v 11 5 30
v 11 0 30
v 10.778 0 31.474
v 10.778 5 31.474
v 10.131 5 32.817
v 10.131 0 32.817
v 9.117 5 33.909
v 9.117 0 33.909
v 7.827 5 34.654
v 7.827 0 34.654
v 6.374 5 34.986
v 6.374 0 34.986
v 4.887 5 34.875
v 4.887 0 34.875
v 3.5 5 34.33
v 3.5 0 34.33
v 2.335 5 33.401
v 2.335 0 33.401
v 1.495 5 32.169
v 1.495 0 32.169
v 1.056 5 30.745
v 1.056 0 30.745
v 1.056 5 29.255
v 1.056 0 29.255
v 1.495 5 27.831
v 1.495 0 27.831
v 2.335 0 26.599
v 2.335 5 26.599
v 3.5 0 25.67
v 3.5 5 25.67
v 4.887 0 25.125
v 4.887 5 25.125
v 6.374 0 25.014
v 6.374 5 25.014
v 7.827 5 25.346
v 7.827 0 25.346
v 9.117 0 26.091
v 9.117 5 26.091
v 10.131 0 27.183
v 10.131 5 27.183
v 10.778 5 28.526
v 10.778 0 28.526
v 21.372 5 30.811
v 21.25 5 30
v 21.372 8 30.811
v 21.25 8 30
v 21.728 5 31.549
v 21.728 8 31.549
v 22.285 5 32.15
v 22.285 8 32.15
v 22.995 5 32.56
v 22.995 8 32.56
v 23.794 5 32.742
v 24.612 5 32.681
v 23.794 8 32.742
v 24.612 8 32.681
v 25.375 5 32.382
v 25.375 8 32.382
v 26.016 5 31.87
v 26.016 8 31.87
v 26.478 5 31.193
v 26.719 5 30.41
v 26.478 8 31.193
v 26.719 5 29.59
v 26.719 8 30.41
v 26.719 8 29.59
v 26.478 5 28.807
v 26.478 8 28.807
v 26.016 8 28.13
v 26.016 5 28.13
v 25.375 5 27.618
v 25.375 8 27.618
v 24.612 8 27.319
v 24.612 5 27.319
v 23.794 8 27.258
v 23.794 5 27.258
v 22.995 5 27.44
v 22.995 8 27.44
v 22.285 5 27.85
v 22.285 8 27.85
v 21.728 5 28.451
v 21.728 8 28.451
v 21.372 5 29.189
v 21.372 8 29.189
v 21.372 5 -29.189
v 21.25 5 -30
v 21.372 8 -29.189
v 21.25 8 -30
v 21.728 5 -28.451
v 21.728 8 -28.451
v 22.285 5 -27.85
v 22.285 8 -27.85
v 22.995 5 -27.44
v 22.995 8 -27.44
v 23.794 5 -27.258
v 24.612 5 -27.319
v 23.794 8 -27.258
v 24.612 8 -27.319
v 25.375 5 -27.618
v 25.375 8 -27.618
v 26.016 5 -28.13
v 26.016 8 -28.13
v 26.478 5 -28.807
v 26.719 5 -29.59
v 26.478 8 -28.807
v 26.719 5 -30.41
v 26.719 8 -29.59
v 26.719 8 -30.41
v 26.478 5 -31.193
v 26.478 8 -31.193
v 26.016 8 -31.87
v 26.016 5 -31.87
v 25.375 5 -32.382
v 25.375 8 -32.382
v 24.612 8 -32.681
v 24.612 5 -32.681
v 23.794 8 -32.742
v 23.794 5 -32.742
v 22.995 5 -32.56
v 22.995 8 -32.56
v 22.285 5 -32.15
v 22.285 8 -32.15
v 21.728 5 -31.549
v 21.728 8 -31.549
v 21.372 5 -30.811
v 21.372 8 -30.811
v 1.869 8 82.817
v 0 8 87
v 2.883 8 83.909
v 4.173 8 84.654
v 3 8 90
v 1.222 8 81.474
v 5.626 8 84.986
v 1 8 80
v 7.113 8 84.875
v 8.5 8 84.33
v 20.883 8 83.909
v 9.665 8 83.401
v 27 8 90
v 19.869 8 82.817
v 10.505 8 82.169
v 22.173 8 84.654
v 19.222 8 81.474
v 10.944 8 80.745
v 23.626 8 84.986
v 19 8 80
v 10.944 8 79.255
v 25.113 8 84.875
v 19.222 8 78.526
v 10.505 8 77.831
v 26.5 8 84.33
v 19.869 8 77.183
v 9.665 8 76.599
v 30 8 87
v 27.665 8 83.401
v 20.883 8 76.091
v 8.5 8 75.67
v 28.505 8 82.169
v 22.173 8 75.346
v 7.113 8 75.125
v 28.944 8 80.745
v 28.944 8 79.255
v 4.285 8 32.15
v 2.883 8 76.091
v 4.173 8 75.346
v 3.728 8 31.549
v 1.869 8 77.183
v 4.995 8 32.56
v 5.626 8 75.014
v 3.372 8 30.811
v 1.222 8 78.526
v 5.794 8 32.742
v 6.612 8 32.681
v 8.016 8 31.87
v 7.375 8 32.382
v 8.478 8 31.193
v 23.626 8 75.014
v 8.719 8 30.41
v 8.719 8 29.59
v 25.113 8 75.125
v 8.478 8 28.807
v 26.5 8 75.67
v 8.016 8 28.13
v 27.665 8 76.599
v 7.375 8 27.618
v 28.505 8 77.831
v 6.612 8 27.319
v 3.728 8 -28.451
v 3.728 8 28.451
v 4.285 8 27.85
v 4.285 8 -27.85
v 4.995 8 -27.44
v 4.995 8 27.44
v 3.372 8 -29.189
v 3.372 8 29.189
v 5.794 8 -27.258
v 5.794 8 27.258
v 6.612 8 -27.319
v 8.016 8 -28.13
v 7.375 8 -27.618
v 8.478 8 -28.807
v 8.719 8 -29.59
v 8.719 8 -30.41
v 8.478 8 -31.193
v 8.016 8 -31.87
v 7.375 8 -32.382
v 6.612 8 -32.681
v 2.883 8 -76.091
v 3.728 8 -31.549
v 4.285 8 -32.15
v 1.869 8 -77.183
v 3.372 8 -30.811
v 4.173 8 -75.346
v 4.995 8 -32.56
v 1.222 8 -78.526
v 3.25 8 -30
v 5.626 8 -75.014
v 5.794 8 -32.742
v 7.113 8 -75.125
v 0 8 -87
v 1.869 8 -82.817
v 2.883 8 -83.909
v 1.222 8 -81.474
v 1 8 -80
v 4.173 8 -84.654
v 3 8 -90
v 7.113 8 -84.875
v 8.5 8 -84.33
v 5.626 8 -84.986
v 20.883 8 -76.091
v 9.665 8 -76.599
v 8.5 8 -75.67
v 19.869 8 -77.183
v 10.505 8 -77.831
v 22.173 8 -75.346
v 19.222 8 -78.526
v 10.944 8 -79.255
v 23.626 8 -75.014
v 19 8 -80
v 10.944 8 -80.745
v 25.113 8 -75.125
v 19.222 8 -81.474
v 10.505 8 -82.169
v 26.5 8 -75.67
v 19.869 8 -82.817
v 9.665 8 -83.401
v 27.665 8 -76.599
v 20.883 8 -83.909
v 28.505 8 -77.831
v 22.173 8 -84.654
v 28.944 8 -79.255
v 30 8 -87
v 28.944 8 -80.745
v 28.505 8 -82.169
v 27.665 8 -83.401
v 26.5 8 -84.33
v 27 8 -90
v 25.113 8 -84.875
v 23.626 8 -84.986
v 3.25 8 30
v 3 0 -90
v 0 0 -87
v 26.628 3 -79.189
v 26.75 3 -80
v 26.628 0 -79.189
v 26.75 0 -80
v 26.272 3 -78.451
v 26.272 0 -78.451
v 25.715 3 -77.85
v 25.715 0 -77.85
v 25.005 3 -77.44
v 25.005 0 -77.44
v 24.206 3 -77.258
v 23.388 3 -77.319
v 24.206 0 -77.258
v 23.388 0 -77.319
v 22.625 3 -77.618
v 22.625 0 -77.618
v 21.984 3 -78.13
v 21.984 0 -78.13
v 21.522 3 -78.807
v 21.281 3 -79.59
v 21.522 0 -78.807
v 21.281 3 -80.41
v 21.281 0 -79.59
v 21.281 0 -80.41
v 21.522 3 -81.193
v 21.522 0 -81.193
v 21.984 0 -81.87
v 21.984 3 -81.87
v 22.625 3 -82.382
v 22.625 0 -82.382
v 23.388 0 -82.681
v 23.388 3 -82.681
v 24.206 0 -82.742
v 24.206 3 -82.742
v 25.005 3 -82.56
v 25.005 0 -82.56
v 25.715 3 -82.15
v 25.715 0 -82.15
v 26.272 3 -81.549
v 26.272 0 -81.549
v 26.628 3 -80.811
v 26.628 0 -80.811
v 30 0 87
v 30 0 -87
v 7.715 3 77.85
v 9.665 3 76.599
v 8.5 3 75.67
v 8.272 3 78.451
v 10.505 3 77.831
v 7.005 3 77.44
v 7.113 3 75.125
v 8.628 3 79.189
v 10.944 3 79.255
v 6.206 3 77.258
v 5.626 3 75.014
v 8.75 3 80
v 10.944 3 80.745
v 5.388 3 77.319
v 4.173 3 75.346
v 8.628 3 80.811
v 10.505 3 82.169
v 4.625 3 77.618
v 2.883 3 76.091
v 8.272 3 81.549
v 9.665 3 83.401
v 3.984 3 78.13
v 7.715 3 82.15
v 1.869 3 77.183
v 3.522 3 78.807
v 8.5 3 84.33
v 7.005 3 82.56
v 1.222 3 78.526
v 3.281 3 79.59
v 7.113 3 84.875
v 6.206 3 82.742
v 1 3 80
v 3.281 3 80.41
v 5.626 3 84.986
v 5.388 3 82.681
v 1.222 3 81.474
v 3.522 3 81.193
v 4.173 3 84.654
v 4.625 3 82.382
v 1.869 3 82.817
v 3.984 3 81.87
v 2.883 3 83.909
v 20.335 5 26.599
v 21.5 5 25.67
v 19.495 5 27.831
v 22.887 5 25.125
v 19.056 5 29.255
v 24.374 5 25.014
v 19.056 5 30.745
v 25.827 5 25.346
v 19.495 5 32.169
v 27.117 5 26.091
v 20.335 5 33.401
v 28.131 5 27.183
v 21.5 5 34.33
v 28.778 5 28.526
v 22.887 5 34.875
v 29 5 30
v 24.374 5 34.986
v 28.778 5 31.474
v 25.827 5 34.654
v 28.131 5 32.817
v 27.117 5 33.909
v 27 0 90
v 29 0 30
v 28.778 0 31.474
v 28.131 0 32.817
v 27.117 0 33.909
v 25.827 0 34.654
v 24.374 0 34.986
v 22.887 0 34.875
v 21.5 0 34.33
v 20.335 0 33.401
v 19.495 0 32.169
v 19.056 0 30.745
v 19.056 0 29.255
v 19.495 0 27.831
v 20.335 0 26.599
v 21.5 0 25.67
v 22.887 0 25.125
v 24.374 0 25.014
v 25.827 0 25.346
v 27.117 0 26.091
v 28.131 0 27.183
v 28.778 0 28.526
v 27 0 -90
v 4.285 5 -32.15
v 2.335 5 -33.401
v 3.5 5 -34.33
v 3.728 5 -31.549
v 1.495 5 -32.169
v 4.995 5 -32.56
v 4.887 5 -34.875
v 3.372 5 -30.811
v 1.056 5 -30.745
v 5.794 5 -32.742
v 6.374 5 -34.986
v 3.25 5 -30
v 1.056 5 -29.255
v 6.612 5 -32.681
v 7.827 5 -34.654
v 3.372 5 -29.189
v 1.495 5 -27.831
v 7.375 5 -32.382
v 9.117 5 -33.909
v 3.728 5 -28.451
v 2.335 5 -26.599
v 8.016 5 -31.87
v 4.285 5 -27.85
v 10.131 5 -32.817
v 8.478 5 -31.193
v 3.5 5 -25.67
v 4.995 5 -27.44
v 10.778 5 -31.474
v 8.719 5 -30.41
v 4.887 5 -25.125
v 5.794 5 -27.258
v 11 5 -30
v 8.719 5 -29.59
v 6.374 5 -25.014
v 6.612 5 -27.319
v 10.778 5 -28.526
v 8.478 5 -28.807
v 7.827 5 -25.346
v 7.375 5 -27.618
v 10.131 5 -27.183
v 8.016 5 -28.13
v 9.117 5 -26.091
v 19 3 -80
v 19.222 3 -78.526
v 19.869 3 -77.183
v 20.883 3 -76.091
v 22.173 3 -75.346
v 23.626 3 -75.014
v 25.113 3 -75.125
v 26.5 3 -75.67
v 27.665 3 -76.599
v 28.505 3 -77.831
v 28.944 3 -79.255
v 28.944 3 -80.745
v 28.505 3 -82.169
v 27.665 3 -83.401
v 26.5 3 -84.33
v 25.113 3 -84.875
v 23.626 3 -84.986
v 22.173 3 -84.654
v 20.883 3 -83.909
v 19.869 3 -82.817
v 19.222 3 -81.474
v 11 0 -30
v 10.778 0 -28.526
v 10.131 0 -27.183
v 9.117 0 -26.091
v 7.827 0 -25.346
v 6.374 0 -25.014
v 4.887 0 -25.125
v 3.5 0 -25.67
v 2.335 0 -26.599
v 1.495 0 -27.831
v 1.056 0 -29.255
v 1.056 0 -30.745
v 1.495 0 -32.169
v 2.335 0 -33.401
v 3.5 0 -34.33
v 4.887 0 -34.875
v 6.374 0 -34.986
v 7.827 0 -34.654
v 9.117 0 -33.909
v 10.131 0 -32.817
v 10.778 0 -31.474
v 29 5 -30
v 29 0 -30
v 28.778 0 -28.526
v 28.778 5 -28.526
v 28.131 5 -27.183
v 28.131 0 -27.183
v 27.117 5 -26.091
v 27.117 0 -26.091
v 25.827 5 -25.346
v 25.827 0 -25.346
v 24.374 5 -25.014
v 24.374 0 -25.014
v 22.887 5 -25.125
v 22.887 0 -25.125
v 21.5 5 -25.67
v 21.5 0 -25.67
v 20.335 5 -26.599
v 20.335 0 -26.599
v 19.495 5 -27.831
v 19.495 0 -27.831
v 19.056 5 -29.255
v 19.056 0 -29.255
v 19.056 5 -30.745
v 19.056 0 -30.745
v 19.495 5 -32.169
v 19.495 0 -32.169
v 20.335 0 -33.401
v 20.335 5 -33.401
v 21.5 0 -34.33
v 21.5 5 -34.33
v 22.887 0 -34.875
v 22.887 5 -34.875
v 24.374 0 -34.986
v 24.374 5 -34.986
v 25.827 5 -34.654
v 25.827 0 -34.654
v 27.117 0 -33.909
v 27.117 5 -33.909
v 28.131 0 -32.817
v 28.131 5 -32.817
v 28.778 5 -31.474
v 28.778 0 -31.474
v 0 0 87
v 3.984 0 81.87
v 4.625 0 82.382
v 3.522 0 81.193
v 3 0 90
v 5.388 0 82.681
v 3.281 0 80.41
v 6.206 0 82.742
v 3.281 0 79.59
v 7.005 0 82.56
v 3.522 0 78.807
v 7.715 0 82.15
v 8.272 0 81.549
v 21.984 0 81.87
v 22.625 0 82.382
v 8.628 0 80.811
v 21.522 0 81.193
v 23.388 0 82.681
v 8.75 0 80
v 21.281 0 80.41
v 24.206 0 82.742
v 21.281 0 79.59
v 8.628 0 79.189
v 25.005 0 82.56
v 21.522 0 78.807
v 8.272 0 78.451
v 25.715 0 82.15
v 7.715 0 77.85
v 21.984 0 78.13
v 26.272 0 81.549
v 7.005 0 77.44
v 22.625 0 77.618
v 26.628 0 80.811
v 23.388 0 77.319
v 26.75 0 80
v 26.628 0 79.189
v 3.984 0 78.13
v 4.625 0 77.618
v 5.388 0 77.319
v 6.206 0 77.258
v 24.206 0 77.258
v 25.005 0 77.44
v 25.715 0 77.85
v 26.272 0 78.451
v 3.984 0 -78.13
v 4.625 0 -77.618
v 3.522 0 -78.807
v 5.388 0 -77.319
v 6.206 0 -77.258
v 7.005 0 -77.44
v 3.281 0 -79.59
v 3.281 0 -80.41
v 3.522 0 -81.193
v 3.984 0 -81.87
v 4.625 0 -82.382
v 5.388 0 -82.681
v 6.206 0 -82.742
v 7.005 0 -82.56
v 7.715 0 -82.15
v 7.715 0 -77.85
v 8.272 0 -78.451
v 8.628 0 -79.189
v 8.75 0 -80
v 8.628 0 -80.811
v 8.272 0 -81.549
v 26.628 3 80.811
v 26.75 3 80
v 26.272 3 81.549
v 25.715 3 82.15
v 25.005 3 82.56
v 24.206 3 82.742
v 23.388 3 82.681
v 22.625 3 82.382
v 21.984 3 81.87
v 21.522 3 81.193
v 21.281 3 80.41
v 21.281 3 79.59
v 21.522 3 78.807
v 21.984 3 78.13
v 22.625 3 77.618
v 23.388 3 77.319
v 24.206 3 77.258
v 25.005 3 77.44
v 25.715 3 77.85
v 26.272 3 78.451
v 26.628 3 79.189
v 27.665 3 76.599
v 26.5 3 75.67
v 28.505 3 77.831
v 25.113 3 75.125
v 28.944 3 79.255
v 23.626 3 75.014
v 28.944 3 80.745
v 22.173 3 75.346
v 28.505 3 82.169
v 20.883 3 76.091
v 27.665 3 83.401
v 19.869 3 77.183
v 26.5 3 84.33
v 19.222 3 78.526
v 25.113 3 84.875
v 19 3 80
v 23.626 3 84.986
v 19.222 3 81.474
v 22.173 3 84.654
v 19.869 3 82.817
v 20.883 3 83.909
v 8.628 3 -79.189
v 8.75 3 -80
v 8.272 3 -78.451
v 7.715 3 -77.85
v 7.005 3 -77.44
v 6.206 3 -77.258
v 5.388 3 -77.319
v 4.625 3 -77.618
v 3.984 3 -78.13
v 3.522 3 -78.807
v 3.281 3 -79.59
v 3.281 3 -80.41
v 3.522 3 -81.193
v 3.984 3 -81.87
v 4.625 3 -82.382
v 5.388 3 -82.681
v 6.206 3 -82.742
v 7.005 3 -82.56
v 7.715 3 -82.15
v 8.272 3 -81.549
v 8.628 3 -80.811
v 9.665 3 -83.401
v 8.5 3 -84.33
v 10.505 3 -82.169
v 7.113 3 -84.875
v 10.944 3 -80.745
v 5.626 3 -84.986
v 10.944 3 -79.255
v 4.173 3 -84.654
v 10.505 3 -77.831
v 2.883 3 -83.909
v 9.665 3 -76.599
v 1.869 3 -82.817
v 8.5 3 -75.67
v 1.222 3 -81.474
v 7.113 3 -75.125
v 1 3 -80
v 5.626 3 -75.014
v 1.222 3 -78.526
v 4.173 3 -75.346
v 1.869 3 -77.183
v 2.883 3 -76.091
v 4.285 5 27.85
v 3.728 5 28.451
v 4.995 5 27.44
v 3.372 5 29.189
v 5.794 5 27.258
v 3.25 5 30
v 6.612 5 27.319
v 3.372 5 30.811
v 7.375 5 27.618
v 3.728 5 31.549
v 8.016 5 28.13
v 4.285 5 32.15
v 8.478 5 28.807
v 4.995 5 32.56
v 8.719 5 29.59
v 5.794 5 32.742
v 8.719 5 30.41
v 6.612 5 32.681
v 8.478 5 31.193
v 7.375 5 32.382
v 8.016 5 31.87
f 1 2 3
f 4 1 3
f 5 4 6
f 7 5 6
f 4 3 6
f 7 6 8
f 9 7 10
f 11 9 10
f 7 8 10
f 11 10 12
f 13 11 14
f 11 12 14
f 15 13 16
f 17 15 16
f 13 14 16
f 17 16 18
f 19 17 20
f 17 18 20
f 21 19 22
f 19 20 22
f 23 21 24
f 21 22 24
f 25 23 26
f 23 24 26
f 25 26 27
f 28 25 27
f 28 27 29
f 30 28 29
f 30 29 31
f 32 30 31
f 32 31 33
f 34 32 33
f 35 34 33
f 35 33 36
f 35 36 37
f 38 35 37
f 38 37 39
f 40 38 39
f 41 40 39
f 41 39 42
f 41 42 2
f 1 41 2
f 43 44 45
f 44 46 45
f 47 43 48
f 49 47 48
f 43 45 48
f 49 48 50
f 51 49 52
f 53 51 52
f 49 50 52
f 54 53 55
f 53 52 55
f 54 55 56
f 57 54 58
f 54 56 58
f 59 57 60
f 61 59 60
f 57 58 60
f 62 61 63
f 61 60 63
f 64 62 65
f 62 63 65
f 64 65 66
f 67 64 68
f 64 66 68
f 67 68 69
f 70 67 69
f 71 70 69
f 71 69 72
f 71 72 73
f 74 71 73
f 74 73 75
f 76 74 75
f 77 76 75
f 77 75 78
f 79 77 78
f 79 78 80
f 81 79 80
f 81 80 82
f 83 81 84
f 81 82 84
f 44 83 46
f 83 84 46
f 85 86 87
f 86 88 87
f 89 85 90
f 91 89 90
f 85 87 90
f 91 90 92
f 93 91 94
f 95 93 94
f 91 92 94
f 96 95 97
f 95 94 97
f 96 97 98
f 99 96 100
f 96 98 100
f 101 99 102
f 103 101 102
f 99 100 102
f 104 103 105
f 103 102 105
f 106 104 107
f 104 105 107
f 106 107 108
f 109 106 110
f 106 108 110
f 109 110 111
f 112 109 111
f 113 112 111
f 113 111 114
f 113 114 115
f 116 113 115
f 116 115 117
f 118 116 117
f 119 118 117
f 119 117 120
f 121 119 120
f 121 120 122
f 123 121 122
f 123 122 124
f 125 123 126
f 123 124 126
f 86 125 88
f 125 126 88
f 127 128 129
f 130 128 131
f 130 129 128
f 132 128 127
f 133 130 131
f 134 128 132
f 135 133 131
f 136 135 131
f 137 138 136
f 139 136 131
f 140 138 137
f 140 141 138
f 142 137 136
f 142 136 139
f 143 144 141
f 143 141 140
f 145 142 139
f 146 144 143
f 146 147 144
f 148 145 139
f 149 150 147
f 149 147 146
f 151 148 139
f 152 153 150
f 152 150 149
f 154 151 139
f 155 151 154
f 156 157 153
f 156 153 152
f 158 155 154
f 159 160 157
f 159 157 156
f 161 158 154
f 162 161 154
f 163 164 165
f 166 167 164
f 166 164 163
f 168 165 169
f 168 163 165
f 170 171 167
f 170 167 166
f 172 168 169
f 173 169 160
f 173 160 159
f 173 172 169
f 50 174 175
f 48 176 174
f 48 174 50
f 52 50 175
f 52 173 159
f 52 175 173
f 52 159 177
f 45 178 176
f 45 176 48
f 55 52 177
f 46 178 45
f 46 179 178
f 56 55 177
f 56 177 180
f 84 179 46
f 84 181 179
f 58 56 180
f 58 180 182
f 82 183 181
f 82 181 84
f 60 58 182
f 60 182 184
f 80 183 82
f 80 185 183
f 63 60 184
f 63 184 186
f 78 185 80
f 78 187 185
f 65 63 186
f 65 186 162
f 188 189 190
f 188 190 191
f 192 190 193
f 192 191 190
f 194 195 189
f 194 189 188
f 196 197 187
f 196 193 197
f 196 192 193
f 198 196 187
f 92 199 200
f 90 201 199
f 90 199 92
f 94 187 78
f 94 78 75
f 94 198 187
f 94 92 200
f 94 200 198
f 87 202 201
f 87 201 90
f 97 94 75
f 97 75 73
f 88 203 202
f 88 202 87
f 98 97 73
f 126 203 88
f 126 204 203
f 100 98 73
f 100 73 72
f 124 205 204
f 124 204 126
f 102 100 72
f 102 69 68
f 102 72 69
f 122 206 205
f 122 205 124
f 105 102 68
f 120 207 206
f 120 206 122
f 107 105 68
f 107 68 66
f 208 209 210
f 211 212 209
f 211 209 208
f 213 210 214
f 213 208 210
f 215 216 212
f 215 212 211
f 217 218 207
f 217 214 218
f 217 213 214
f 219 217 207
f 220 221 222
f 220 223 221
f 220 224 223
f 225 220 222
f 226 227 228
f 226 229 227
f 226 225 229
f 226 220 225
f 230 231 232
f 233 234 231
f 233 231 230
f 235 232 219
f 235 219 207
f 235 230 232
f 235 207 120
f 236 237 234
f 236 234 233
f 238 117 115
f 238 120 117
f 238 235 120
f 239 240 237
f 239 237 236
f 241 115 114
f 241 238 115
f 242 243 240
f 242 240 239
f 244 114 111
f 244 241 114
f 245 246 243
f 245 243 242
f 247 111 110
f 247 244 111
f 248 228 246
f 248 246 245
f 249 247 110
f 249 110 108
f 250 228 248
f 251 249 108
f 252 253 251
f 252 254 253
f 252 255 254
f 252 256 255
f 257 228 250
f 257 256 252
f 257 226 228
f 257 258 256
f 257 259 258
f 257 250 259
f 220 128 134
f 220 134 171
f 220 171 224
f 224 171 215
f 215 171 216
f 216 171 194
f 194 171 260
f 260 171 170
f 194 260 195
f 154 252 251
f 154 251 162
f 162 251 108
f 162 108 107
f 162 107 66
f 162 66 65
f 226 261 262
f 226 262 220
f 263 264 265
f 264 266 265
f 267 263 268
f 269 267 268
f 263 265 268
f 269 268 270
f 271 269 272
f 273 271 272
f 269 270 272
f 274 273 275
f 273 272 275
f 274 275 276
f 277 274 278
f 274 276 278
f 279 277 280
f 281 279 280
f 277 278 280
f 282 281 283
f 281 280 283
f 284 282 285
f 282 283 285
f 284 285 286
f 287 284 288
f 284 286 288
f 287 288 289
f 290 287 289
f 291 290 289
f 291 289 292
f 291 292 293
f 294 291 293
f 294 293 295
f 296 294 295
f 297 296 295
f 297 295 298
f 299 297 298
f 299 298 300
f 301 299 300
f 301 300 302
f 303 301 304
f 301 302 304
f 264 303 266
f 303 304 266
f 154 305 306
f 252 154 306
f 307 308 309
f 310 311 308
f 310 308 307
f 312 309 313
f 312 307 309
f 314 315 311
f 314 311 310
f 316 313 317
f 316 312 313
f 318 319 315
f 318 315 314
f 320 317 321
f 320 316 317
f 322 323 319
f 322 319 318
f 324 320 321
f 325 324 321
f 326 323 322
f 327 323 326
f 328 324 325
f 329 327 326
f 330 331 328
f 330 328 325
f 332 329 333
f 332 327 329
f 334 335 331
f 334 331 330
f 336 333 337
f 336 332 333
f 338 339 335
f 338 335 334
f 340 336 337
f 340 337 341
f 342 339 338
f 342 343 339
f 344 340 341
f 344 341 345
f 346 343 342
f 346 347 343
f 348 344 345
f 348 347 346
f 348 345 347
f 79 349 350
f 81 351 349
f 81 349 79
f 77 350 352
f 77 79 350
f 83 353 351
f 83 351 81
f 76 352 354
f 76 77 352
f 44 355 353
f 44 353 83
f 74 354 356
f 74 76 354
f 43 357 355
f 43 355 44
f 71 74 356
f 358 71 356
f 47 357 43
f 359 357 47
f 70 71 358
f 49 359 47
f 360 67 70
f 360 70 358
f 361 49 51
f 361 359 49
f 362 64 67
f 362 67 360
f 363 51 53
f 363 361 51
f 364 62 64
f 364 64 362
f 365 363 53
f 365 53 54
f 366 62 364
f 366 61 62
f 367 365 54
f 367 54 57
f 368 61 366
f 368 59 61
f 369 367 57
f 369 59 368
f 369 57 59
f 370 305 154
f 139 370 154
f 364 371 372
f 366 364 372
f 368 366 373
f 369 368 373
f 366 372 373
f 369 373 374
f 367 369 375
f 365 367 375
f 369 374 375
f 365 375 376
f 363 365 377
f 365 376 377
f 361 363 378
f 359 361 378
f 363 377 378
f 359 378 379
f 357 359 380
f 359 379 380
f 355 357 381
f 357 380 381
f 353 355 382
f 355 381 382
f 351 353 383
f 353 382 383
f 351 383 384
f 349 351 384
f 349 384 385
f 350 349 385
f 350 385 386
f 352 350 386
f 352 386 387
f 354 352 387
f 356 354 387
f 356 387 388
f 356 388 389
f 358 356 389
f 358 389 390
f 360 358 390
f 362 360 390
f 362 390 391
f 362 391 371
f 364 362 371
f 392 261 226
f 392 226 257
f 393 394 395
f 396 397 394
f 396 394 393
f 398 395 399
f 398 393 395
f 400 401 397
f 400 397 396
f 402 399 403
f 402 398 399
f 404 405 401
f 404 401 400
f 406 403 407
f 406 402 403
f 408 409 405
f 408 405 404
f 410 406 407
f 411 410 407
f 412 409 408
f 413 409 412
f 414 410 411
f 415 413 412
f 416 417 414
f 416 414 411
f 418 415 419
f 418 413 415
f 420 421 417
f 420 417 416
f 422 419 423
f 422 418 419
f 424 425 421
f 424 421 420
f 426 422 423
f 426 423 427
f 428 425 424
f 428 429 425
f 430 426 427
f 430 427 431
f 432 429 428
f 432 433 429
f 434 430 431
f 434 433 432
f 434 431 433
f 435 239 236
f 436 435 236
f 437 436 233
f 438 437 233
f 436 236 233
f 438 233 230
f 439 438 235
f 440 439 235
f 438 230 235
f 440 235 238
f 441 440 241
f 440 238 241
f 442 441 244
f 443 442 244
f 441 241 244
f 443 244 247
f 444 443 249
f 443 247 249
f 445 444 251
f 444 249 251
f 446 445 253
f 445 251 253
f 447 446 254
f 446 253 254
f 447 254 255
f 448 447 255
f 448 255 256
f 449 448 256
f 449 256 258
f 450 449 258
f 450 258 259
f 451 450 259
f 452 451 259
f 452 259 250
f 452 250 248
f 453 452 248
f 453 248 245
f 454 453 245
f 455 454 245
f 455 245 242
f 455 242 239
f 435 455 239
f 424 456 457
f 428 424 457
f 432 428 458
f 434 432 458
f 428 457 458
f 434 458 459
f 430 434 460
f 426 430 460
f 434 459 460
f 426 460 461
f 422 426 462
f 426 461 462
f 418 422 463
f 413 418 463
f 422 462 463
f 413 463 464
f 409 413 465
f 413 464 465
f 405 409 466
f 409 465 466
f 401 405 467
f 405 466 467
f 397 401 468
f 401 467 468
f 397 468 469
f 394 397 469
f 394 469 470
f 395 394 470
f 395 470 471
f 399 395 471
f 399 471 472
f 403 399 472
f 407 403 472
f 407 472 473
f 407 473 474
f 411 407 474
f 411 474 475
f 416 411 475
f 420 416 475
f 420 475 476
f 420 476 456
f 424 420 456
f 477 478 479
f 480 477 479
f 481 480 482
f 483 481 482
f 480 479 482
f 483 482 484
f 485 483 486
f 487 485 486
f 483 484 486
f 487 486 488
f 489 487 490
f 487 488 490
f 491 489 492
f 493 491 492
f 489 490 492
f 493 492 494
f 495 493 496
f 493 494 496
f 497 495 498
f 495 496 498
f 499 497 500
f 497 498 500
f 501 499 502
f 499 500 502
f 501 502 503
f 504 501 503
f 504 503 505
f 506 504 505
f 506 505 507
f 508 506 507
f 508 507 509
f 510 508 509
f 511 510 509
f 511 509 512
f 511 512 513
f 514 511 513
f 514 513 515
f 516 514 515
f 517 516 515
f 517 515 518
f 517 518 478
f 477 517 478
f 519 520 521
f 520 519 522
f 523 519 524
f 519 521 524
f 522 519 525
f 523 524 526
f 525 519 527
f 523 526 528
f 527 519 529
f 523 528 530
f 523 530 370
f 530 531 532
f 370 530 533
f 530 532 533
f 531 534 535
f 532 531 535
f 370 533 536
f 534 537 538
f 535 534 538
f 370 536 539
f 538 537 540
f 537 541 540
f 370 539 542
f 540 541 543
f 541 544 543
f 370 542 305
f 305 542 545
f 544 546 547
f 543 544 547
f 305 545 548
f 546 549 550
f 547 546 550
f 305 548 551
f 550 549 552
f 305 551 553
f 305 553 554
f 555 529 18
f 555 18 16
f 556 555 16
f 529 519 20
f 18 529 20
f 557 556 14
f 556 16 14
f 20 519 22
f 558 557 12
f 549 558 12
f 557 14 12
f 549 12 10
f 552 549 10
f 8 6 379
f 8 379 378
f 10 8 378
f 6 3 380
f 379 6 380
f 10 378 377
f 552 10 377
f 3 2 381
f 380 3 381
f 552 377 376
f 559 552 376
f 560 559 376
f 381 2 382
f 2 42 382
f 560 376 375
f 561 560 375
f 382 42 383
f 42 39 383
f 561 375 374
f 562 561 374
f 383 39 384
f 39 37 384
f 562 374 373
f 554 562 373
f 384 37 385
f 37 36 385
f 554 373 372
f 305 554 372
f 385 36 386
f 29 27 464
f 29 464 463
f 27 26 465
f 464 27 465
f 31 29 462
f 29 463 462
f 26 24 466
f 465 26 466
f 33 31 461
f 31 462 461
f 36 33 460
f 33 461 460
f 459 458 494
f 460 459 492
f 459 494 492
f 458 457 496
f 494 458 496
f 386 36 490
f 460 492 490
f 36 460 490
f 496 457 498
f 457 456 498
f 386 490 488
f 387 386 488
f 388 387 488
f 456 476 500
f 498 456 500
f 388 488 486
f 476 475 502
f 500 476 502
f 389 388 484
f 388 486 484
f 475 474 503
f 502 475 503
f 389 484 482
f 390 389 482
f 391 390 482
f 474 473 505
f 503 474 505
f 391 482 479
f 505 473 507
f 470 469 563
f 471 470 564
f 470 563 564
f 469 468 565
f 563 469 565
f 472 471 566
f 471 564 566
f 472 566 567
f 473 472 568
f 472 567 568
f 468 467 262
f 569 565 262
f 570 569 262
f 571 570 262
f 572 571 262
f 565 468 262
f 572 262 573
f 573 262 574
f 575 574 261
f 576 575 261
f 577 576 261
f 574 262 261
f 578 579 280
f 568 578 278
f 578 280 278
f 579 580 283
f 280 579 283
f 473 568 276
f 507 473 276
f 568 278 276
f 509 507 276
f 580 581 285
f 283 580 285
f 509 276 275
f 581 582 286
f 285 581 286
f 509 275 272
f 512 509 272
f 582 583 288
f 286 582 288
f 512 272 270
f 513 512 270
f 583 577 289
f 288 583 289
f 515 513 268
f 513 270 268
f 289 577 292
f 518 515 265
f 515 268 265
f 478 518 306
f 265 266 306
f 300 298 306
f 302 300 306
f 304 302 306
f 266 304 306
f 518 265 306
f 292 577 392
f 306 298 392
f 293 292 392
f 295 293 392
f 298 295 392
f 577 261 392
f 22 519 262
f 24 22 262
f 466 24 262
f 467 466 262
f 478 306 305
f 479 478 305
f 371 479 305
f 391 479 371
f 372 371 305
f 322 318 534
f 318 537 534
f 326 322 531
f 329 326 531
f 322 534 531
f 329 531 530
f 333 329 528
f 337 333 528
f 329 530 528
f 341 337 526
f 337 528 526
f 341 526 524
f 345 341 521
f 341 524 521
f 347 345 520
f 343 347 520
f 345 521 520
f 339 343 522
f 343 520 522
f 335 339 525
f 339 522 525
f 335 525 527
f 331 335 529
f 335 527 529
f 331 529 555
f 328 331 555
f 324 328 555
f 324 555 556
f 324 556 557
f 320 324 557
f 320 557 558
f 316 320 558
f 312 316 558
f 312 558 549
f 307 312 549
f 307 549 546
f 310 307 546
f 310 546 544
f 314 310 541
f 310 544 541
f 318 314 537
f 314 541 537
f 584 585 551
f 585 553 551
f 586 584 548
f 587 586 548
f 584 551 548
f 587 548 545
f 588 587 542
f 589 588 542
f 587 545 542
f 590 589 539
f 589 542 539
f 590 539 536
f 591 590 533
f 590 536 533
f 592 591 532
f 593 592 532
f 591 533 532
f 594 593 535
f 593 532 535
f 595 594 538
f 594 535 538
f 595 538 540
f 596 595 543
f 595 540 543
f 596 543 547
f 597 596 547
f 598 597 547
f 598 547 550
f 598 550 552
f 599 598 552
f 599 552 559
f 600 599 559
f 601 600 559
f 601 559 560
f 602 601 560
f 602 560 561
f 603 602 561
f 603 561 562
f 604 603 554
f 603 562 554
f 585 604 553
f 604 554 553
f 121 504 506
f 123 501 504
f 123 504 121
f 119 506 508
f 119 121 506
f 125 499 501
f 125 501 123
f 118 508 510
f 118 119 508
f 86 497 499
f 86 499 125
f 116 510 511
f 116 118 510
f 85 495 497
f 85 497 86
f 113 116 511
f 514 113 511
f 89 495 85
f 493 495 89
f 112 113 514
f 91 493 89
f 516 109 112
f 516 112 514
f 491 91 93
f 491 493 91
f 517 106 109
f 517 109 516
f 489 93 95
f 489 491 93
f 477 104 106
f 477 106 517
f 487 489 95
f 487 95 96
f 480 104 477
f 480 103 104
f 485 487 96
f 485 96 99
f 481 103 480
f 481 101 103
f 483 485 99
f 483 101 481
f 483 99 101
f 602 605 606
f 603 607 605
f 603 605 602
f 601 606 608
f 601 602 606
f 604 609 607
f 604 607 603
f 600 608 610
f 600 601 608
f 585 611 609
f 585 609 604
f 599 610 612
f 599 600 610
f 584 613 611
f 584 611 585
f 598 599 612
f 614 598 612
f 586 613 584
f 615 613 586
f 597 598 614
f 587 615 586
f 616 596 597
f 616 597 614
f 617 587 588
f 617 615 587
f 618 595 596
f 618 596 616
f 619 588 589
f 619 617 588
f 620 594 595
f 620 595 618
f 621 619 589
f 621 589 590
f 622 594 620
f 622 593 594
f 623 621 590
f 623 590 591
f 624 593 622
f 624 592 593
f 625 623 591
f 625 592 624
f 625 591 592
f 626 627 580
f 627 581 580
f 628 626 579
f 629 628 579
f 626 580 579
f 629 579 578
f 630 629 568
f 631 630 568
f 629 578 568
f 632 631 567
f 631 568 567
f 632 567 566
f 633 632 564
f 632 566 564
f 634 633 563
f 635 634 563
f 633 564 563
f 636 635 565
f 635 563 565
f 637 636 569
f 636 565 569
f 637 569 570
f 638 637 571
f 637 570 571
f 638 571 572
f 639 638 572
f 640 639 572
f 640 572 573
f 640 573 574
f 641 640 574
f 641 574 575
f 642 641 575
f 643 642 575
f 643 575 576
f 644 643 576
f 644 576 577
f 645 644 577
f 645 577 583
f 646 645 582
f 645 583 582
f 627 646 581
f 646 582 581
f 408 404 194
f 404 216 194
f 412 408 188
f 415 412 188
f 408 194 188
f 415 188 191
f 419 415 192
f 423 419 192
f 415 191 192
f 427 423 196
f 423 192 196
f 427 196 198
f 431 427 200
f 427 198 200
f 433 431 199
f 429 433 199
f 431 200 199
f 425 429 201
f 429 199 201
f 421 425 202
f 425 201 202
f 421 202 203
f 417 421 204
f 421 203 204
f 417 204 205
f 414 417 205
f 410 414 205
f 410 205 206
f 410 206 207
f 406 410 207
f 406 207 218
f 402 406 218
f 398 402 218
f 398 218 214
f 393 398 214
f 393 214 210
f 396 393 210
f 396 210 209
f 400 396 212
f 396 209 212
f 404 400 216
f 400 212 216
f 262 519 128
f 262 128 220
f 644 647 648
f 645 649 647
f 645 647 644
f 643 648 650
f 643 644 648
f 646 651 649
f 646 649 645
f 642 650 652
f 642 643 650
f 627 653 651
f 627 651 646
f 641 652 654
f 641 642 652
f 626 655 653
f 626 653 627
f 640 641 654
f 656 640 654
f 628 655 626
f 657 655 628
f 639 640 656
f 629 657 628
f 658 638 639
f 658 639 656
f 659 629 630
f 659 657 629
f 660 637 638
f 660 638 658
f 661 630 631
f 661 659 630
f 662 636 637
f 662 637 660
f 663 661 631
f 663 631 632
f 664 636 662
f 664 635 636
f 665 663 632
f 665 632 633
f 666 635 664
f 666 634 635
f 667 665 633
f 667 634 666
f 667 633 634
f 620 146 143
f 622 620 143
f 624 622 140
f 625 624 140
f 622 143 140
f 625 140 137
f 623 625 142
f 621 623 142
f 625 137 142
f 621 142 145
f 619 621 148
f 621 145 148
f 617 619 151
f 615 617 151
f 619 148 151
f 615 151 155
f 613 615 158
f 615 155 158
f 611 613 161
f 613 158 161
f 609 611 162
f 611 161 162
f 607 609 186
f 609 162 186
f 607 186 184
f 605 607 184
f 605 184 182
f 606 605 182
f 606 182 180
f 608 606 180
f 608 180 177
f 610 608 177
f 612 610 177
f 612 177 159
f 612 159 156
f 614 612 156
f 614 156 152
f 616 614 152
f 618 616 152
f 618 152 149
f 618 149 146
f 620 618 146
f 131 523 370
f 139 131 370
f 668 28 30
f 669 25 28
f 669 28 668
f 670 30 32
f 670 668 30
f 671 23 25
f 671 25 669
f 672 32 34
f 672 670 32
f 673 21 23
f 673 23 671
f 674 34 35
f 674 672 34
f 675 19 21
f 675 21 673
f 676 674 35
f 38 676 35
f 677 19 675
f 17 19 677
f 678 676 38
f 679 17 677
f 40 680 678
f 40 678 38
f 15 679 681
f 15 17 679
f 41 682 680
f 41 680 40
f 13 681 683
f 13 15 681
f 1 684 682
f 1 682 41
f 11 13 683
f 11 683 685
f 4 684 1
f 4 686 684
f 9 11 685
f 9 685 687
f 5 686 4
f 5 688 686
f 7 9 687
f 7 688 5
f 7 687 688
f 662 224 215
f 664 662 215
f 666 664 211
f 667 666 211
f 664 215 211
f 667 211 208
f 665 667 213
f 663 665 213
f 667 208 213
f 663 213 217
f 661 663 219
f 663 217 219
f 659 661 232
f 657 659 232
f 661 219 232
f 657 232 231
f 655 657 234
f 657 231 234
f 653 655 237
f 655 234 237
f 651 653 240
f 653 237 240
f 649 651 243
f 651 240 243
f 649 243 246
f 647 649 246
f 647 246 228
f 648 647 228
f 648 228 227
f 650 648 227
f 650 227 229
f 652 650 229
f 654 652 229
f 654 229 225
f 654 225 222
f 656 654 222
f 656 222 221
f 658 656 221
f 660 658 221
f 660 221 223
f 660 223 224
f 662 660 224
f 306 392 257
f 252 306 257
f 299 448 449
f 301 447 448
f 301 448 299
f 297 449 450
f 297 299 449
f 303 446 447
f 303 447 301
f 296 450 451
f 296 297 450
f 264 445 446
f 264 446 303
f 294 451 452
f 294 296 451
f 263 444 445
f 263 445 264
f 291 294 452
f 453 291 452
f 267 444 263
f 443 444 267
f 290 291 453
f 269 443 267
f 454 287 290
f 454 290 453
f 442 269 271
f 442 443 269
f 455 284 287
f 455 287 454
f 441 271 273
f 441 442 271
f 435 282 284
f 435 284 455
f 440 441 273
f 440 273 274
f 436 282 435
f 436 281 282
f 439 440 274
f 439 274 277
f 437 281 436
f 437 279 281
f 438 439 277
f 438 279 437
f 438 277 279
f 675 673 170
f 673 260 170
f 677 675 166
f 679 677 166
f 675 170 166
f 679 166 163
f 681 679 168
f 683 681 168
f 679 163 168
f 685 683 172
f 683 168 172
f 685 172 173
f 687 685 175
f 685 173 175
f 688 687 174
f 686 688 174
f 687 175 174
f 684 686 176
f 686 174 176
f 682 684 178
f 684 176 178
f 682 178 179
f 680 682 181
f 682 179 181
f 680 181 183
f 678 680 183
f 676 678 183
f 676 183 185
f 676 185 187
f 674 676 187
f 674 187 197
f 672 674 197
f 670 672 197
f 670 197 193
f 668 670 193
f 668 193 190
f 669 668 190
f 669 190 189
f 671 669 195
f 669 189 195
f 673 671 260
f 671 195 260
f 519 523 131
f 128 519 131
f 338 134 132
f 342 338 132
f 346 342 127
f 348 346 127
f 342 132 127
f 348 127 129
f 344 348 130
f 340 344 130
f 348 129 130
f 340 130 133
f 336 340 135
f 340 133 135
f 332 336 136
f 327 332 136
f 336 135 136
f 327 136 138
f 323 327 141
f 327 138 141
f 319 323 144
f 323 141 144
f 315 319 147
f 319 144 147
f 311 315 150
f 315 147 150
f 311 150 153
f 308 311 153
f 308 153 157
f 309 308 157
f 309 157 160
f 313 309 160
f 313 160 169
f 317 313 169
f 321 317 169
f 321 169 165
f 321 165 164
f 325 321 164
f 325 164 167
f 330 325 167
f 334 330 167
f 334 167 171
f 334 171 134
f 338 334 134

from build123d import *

# Parameters (mm, degrees)
SKETCH1_W                                       = 30
SKETCH1_H                                       = 180
BOSS_EXTRUDE1_DEPTH                             = 8
CHAMFER1_SIZE                                   = 3
CBORE_FOR_M5_SOCKET_HEAD_CAP_SCREW1_D           = 5.5
CBORE_FOR_M5_SOCKET_HEAD_CAP_SCREW1_CBORE_D     = 10
CBORE_FOR_M5_SOCKET_HEAD_CAP_SCREW1_CBORE_DEPTH = 5
CBORE_FOR_M5_SOCKET_HEAD_CAP_SCREW2_D           = 5.5
CBORE_FOR_M5_SOCKET_HEAD_CAP_SCREW2_CBORE_D     = 10
CBORE_FOR_M5_SOCKET_HEAD_CAP_SCREW2_CBORE_DEPTH = 5


with BuildPart() as part:
    # Sketch1 → Boss-Extrude1 (new body)
    with BuildSketch(Plane(origin=(0, 0, 0), x_dir=(1, 0, 0), z_dir=(0, 1, 0))):
        with Locations((15, 0)):
            Rectangle(SKETCH1_W, SKETCH1_H)
    extrude(amount=BOSS_EXTRUDE1_DEPTH)

    # Chamfer1
    chamfer1_edges = [part.edges().sort_by_distance(p)[0] for p in [
        (30, 4, 90),
        (0, 4, 90),
        (0, 4, -90),
        (30, 4, -90),
    ]]
    chamfer(chamfer1_edges, length=CHAMFER1_SIZE)

    # CBORE for M5 Socket Head Cap Screw1 (through all)
    with Locations(Plane(origin=(0, 8, 0), x_dir=(-1, 0, 0), z_dir=(0, 1, 0))):
        with Locations((-6, -80), (-6, 80), (-24, 80), (-24, -80)):
            CounterBoreHole(CBORE_FOR_M5_SOCKET_HEAD_CAP_SCREW1_D / 2, CBORE_FOR_M5_SOCKET_HEAD_CAP_SCREW1_CBORE_D / 2, CBORE_FOR_M5_SOCKET_HEAD_CAP_SCREW1_CBORE_DEPTH)

    # CBORE for M5 Socket Head Cap Screw2 (through all)
    with Locations(Plane.XZ):
        with Locations((6, 30), (6, -30), (24, -30), (24, 30)):
            CounterBoreHole(CBORE_FOR_M5_SOCKET_HEAD_CAP_SCREW2_D / 2, CBORE_FOR_M5_SOCKET_HEAD_CAP_SCREW2_CBORE_D / 2, CBORE_FOR_M5_SOCKET_HEAD_CAP_SCREW2_CBORE_DEPTH)


solid = part.part
